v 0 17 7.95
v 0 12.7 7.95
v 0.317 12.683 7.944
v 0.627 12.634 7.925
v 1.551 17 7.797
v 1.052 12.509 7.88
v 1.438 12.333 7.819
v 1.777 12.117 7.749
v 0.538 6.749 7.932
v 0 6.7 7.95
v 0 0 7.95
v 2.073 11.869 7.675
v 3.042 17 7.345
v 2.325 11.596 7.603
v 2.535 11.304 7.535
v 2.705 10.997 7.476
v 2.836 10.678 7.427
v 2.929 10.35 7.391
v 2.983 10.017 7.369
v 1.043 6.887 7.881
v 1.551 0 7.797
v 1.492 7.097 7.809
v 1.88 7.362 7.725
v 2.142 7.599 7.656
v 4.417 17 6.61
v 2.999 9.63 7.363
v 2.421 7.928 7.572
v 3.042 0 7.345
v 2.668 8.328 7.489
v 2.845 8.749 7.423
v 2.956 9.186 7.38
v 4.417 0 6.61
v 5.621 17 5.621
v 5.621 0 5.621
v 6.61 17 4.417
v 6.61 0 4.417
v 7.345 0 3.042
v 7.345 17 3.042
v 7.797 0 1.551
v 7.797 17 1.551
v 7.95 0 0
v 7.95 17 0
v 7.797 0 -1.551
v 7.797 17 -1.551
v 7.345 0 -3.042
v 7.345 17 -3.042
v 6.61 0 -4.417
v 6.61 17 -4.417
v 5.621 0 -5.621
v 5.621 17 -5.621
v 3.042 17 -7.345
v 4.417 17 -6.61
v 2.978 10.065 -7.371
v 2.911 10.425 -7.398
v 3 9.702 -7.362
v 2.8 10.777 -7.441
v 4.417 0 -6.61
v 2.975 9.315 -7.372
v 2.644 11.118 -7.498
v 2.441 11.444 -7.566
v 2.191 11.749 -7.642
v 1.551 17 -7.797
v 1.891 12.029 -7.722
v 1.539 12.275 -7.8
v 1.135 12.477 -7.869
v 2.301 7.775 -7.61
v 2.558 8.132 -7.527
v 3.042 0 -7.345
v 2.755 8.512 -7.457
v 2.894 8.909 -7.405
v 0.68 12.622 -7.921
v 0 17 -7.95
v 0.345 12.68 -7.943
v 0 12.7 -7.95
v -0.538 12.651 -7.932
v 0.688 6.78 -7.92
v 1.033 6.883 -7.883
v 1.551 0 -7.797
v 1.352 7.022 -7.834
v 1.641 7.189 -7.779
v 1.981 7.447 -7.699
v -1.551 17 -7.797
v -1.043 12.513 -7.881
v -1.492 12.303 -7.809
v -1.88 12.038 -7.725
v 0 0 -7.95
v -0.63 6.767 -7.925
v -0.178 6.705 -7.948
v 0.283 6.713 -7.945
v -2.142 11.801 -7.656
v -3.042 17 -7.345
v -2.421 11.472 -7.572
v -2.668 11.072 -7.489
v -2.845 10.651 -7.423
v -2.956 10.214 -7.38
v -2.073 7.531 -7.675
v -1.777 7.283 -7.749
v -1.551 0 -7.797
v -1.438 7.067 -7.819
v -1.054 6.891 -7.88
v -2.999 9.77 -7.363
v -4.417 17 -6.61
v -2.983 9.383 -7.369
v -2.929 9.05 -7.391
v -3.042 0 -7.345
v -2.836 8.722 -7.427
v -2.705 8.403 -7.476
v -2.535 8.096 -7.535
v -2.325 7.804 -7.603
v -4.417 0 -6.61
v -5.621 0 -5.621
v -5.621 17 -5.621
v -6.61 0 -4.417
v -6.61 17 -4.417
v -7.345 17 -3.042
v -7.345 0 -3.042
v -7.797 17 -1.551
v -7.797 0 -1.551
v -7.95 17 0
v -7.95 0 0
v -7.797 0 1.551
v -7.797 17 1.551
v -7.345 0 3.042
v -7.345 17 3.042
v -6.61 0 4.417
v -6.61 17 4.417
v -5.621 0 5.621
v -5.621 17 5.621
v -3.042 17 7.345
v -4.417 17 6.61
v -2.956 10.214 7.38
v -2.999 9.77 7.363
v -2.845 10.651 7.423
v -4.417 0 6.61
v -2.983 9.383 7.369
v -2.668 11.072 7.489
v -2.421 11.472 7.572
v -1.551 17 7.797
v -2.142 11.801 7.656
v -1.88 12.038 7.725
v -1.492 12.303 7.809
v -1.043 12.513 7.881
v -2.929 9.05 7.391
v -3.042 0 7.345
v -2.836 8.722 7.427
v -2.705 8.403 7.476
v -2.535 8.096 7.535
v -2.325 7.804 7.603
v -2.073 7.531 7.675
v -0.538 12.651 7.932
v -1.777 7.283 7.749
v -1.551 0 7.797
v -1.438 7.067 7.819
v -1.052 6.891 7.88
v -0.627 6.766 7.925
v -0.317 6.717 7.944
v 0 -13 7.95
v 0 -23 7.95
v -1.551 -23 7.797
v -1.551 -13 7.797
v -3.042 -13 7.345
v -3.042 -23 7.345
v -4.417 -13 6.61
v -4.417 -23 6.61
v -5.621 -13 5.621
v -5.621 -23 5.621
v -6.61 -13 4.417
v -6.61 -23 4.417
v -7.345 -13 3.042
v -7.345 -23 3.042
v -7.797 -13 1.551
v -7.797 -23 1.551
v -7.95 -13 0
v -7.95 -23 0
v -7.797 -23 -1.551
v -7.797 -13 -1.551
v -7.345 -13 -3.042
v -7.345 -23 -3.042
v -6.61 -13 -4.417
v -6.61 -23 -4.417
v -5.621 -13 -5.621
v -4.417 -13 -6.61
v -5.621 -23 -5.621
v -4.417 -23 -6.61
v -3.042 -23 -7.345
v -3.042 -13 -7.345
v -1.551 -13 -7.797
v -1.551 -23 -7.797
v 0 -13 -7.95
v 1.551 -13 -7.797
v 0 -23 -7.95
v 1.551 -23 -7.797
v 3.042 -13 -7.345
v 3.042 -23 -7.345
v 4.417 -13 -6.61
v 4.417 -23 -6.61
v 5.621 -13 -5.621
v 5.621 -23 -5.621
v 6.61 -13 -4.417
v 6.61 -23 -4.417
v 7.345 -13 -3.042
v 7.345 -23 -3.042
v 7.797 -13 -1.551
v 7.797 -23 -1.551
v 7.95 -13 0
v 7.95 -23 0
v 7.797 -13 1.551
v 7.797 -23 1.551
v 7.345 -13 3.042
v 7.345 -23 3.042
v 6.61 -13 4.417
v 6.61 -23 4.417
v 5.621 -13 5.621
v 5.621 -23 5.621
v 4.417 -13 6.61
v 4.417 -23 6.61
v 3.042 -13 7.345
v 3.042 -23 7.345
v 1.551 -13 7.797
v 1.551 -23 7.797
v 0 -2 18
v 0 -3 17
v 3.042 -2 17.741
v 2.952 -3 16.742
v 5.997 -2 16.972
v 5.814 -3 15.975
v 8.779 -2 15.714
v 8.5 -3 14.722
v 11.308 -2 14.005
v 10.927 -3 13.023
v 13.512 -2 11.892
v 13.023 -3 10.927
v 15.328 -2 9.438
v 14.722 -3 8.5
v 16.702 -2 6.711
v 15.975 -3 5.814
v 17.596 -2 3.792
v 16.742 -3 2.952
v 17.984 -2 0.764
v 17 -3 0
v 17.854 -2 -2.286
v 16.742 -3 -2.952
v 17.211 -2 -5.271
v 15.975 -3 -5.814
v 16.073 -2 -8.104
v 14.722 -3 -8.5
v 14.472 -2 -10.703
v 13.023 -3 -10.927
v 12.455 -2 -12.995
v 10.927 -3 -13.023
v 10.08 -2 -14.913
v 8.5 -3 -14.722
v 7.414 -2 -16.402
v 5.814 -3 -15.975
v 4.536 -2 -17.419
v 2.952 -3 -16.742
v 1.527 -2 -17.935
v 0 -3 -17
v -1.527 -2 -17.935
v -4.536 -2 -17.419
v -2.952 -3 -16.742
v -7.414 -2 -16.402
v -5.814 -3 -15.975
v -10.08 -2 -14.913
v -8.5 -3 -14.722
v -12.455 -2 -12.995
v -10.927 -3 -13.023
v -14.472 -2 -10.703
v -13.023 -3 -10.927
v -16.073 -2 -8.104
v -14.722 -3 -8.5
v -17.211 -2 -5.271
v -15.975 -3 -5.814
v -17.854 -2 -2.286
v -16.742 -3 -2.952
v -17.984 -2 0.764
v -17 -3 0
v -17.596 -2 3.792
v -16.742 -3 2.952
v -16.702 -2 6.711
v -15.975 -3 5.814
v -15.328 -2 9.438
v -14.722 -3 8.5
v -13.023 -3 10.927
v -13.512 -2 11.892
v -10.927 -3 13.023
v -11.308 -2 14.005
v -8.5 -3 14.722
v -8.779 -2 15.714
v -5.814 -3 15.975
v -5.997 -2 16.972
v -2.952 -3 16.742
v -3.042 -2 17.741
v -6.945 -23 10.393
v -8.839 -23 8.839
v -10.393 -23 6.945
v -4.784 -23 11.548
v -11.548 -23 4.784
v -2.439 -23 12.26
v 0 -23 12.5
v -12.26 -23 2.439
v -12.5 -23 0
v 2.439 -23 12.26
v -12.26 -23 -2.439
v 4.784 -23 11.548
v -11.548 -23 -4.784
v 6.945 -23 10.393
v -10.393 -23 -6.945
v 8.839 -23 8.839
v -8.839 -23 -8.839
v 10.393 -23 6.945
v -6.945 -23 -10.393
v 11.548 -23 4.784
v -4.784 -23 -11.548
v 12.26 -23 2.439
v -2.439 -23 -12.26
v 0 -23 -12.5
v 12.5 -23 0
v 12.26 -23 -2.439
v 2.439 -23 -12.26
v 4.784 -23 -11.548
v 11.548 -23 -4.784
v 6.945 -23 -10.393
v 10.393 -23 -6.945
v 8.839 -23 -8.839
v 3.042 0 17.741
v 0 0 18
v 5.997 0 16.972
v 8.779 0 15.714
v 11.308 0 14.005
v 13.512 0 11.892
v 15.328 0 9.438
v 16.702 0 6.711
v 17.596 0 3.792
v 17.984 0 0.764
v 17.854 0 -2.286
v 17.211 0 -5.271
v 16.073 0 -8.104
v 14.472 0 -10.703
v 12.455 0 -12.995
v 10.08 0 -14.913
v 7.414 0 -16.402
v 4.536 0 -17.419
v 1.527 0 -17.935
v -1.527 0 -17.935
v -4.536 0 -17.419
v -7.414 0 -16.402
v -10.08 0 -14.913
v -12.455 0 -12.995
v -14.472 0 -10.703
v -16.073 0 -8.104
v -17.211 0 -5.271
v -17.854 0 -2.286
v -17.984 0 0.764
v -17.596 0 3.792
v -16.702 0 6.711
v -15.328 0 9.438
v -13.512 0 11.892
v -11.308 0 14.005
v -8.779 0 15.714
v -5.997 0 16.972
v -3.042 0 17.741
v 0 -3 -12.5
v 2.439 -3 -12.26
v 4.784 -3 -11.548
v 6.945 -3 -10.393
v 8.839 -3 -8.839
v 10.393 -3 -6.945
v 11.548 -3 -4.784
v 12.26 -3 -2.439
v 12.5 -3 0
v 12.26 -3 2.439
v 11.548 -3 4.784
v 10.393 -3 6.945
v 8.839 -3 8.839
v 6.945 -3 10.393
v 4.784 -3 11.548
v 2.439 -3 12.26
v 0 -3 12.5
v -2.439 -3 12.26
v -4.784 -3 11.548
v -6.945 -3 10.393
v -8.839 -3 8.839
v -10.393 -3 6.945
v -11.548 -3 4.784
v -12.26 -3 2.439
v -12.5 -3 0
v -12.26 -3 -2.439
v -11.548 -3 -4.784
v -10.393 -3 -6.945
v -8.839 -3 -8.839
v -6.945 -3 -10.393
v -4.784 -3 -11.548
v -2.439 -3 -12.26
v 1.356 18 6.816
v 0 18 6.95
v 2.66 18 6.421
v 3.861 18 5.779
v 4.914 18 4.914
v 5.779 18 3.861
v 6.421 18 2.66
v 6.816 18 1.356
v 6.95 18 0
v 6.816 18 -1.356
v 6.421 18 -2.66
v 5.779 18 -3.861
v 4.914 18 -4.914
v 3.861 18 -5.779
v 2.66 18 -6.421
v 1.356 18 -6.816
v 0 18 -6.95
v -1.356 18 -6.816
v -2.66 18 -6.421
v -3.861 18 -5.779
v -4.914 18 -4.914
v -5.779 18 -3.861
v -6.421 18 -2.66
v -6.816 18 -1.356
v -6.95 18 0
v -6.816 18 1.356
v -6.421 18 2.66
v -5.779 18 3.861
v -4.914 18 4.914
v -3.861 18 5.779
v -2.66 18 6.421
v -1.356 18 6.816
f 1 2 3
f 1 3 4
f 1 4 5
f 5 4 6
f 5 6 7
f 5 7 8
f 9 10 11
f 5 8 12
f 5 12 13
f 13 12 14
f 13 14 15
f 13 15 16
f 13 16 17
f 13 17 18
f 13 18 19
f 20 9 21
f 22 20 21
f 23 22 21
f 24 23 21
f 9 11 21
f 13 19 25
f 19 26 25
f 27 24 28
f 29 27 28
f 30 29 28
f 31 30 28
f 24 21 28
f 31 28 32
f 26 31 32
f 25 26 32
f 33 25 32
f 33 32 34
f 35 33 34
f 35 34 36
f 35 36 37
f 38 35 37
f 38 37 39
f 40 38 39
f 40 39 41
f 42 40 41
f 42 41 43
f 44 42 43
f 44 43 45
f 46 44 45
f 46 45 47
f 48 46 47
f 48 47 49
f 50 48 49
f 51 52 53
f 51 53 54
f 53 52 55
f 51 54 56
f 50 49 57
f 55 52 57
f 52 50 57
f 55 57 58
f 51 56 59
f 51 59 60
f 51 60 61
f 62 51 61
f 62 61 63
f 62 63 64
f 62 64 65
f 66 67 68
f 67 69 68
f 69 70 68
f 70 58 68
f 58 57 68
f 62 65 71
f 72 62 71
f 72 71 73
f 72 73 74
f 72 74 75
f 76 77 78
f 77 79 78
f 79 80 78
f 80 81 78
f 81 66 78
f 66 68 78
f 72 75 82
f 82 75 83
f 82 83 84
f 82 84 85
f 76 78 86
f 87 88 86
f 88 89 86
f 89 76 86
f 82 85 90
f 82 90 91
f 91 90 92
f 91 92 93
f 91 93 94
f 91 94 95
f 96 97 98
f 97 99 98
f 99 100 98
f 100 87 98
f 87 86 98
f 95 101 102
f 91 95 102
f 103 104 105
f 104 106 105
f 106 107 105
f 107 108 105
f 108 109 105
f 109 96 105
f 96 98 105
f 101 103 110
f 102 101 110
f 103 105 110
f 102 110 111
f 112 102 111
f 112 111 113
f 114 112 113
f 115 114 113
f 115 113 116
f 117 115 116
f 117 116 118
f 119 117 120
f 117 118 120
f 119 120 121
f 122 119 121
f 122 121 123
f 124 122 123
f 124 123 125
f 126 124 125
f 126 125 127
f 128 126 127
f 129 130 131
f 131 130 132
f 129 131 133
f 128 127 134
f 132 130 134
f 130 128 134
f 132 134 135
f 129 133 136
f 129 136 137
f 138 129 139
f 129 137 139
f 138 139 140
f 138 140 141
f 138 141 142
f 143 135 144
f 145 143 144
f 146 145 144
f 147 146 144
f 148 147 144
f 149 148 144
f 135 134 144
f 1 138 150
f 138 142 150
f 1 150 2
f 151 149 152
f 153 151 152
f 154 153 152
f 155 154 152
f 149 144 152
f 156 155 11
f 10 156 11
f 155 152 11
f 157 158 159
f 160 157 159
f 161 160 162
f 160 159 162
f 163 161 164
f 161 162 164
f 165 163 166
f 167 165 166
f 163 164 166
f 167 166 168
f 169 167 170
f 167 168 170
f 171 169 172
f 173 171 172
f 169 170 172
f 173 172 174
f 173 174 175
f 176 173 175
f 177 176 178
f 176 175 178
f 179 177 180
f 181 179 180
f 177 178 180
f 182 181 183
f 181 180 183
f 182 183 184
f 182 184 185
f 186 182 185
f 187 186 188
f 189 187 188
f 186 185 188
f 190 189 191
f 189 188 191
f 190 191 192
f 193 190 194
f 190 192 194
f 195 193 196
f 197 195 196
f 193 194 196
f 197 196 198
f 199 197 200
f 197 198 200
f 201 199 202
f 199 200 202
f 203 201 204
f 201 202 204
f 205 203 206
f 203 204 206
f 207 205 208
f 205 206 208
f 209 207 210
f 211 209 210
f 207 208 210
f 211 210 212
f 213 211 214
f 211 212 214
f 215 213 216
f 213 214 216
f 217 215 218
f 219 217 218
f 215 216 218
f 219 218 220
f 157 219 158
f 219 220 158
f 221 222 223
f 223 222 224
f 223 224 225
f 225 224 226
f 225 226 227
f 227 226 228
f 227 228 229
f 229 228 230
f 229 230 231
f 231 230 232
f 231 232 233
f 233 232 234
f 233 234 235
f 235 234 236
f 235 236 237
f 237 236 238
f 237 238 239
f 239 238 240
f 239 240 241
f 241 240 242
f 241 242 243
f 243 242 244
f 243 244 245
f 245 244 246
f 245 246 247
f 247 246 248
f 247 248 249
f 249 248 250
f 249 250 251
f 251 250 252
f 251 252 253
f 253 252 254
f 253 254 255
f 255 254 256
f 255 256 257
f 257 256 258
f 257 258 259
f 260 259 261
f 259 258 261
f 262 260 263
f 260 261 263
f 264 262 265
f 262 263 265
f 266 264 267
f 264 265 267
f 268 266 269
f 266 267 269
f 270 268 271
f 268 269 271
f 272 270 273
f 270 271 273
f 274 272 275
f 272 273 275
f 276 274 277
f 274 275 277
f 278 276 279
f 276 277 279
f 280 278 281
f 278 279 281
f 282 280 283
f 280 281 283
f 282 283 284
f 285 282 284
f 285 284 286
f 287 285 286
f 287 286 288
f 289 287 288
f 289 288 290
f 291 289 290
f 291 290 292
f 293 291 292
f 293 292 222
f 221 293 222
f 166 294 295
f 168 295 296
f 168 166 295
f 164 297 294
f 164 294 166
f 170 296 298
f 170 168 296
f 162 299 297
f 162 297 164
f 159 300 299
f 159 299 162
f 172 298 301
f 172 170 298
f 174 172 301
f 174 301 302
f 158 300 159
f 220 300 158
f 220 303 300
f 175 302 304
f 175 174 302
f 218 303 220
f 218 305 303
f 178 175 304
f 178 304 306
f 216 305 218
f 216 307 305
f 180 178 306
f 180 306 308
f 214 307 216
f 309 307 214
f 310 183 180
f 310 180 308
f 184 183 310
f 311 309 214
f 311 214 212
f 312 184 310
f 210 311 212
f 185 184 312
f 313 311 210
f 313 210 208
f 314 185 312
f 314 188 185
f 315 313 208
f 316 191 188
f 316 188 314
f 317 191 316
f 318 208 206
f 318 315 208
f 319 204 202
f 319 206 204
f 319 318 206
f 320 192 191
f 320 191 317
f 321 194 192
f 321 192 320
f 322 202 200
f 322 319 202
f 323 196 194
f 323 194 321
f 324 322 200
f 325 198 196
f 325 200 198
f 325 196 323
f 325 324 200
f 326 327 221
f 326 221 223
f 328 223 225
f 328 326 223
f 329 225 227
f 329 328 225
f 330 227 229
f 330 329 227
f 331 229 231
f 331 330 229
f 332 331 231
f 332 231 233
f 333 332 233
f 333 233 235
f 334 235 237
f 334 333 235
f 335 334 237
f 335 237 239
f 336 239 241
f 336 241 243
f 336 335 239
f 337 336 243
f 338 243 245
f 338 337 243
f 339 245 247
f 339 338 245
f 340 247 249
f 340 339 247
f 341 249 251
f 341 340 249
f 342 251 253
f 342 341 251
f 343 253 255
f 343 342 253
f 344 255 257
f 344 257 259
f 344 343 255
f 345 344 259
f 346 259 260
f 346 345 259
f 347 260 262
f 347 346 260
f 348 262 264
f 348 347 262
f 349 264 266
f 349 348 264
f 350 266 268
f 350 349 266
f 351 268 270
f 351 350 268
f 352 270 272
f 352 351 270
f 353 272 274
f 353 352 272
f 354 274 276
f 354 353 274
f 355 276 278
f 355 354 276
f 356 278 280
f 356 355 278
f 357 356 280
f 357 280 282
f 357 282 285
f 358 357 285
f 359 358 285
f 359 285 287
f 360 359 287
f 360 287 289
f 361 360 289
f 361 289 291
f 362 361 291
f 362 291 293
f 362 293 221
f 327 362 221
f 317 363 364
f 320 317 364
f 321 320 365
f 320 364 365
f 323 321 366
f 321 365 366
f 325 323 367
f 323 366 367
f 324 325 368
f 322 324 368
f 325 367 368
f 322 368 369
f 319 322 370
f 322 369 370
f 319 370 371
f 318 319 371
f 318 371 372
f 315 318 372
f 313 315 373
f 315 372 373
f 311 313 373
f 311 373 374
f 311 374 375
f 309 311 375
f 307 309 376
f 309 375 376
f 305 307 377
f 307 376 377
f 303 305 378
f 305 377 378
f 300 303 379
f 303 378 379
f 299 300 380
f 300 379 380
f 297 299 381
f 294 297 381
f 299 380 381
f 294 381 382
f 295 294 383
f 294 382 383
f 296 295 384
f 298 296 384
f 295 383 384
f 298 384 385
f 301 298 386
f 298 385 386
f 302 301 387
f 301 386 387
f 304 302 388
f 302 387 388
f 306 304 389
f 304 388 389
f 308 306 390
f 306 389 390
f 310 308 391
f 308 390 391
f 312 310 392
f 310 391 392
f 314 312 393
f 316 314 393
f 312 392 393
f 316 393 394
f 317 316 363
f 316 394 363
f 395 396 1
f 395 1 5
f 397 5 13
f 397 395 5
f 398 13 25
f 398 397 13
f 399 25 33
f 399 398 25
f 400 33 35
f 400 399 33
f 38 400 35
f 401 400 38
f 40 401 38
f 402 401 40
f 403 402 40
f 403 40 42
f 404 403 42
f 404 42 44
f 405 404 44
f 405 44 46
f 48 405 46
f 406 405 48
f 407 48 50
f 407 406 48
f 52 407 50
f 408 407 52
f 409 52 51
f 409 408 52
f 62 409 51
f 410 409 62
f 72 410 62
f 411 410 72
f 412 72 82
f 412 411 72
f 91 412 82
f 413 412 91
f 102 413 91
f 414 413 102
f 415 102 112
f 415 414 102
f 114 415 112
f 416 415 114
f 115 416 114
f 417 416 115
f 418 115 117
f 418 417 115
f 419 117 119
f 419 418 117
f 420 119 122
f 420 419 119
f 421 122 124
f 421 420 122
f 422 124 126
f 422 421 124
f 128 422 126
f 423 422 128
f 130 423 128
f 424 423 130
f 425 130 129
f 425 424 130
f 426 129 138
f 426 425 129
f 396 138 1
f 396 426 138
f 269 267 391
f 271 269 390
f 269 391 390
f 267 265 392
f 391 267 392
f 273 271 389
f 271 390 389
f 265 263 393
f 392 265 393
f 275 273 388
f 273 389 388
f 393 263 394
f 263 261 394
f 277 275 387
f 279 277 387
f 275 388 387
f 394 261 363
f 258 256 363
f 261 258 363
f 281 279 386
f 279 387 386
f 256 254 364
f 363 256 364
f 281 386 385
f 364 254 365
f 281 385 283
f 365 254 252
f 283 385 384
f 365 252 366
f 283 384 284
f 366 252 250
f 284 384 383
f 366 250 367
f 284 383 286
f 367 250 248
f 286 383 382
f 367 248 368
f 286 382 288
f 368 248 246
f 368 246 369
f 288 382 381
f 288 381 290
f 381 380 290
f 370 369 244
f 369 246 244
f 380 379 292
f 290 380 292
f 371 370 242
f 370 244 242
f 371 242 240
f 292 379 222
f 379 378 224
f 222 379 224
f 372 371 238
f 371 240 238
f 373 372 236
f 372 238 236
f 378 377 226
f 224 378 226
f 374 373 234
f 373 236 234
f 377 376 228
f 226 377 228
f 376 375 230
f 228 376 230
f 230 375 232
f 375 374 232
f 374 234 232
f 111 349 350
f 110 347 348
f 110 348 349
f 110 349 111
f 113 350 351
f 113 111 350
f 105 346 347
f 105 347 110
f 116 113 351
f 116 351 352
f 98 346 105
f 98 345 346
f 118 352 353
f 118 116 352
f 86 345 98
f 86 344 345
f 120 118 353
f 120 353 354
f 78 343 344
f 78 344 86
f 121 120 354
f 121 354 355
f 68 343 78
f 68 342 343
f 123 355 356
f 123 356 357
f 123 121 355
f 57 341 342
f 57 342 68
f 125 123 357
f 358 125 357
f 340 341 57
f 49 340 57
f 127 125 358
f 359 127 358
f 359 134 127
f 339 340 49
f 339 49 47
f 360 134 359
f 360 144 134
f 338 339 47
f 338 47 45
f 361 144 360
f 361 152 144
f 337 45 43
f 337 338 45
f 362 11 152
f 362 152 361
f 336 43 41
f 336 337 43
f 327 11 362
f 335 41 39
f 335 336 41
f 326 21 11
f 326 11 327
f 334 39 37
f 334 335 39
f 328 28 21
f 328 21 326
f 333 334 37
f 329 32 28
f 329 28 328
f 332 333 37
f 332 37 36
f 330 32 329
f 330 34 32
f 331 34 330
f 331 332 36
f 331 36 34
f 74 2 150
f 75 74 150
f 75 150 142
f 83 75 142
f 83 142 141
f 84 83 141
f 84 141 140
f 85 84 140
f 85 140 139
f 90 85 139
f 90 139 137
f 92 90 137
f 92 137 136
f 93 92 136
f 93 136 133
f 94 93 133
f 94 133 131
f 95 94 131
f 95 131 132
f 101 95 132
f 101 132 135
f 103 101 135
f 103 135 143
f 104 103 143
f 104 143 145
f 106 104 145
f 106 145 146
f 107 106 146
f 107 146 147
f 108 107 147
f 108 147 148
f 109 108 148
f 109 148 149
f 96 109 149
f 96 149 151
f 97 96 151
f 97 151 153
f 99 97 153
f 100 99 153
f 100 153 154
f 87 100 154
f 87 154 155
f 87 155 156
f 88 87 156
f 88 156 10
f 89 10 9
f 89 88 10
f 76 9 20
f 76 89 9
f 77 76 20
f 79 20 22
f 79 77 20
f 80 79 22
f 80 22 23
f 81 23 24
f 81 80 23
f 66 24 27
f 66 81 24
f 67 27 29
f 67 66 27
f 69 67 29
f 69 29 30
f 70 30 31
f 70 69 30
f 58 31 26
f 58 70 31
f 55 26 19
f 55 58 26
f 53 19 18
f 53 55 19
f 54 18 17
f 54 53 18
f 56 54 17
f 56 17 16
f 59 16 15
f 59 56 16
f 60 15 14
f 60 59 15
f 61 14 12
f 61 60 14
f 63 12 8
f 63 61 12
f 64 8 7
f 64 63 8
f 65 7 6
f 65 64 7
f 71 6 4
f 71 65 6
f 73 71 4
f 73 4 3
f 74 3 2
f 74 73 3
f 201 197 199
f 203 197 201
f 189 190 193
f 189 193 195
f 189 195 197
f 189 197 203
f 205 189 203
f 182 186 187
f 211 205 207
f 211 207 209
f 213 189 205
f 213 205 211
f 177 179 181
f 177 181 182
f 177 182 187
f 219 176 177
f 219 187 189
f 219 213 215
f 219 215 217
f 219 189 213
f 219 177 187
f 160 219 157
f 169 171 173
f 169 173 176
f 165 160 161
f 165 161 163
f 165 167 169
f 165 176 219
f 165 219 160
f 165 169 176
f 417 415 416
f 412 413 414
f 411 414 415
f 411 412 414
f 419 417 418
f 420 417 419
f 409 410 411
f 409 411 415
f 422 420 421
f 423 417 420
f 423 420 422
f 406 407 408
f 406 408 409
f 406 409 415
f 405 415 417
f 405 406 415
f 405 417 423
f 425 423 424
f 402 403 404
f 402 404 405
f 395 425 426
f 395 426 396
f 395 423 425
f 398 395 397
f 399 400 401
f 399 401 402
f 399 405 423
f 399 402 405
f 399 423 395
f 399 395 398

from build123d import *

# Parameters (mm, degrees)
SKETCH_1_R               = 7.95
EXTRUDE_1_DEPTH          = 18
CHAMFER_2_SIZE           = 1
SKETCH_4_R               = 18
EXTRUDE_2_DEPTH          = 3
CHAMFER_1_SIZE           = 1
SKETCH_5_R               = 12.5
EXTRUDE_3_DEPTH          = 20
CUT_EXTRUDE_2_DEPTH      = 35.307433597
CUT_EXTRUDE_2_DEPTH_BACK = 35.307433597
SKETCH_9_R               = 3
CUT_EXTRUDE_START        = 20
SKETCH_10_R              = 7.95
CUT_EXTRUDE_3_DEPTH      = 10


with BuildPart() as part:
    # 草图1 → 凸台-拉伸1 (new body)
    with BuildSketch(Plane(origin=(0, 0, 0), x_dir=(1, 0, 0), z_dir=(0, 1, 0))):
        with Locations(Location((0, 0, 0), (0, 0, 270))):
            Circle(SKETCH_1_R)
    extrude(amount=EXTRUDE_1_DEPTH)

    # 倒角2
    chamfer_2_edges = [part.edges().sort_by_distance(p)[0] for p in [
        (0, 18, -7.95),
    ]]
    chamfer(chamfer_2_edges, length=CHAMFER_2_SIZE)

    # 草图4 → 凸台-拉伸2 (add)
    with BuildSketch(Plane(origin=(0, 0, 0), x_dir=(1, 0, 0), z_dir=(0, 1, 0))):
        with Locations(Location((0, 0, 0), (0, 0, 270))):
            Circle(SKETCH_4_R)
    extrude(amount=-EXTRUDE_2_DEPTH)

    # 倒角1
    chamfer_1_edges = [part.edges().sort_by_distance(p)[0] for p in [
        (0, -3, -18),
    ]]
    chamfer(chamfer_1_edges, length=CHAMFER_1_SIZE)

    # 草图5 → 凸台-拉伸3 (add)
    with BuildSketch(Plane(origin=(0, -3, 0), x_dir=(-1, 0, 0), z_dir=(0, -1, 0))):
        with Locations(Location((0, 0, 0), (0, 0, 90))):
            Circle(SKETCH_5_R)
    extrude(amount=EXTRUDE_3_DEPTH)

    # 草图9 → 切除-拉伸2 (cut, two sides: drawn at the far end of the back side and taken through both)
    with BuildSketch(Plane.XY.offset(-CUT_EXTRUDE_2_DEPTH_BACK)):
        with Locations(Location((0, 9.7, 0), (0, 0, 89.999999999))):
            Circle(SKETCH_9_R)
    extrude(amount=CUT_EXTRUDE_2_DEPTH + CUT_EXTRUDE_2_DEPTH_BACK, mode=Mode.SUBTRACT)

    # 草图10 → 切除-拉伸3 (cut)
    with BuildSketch(Plane(origin=(0, -3, 0), x_dir=(-1, 0, 0), z_dir=(0, -1, 0)).offset(CUT_EXTRUDE_START)):
        with Locations(Location((0, 0, 0), (0, 0, 270))):
            Circle(SKETCH_10_R)
    extrude(amount=-CUT_EXTRUDE_3_DEPTH, mode=Mode.SUBTRACT)


solid = part.part
